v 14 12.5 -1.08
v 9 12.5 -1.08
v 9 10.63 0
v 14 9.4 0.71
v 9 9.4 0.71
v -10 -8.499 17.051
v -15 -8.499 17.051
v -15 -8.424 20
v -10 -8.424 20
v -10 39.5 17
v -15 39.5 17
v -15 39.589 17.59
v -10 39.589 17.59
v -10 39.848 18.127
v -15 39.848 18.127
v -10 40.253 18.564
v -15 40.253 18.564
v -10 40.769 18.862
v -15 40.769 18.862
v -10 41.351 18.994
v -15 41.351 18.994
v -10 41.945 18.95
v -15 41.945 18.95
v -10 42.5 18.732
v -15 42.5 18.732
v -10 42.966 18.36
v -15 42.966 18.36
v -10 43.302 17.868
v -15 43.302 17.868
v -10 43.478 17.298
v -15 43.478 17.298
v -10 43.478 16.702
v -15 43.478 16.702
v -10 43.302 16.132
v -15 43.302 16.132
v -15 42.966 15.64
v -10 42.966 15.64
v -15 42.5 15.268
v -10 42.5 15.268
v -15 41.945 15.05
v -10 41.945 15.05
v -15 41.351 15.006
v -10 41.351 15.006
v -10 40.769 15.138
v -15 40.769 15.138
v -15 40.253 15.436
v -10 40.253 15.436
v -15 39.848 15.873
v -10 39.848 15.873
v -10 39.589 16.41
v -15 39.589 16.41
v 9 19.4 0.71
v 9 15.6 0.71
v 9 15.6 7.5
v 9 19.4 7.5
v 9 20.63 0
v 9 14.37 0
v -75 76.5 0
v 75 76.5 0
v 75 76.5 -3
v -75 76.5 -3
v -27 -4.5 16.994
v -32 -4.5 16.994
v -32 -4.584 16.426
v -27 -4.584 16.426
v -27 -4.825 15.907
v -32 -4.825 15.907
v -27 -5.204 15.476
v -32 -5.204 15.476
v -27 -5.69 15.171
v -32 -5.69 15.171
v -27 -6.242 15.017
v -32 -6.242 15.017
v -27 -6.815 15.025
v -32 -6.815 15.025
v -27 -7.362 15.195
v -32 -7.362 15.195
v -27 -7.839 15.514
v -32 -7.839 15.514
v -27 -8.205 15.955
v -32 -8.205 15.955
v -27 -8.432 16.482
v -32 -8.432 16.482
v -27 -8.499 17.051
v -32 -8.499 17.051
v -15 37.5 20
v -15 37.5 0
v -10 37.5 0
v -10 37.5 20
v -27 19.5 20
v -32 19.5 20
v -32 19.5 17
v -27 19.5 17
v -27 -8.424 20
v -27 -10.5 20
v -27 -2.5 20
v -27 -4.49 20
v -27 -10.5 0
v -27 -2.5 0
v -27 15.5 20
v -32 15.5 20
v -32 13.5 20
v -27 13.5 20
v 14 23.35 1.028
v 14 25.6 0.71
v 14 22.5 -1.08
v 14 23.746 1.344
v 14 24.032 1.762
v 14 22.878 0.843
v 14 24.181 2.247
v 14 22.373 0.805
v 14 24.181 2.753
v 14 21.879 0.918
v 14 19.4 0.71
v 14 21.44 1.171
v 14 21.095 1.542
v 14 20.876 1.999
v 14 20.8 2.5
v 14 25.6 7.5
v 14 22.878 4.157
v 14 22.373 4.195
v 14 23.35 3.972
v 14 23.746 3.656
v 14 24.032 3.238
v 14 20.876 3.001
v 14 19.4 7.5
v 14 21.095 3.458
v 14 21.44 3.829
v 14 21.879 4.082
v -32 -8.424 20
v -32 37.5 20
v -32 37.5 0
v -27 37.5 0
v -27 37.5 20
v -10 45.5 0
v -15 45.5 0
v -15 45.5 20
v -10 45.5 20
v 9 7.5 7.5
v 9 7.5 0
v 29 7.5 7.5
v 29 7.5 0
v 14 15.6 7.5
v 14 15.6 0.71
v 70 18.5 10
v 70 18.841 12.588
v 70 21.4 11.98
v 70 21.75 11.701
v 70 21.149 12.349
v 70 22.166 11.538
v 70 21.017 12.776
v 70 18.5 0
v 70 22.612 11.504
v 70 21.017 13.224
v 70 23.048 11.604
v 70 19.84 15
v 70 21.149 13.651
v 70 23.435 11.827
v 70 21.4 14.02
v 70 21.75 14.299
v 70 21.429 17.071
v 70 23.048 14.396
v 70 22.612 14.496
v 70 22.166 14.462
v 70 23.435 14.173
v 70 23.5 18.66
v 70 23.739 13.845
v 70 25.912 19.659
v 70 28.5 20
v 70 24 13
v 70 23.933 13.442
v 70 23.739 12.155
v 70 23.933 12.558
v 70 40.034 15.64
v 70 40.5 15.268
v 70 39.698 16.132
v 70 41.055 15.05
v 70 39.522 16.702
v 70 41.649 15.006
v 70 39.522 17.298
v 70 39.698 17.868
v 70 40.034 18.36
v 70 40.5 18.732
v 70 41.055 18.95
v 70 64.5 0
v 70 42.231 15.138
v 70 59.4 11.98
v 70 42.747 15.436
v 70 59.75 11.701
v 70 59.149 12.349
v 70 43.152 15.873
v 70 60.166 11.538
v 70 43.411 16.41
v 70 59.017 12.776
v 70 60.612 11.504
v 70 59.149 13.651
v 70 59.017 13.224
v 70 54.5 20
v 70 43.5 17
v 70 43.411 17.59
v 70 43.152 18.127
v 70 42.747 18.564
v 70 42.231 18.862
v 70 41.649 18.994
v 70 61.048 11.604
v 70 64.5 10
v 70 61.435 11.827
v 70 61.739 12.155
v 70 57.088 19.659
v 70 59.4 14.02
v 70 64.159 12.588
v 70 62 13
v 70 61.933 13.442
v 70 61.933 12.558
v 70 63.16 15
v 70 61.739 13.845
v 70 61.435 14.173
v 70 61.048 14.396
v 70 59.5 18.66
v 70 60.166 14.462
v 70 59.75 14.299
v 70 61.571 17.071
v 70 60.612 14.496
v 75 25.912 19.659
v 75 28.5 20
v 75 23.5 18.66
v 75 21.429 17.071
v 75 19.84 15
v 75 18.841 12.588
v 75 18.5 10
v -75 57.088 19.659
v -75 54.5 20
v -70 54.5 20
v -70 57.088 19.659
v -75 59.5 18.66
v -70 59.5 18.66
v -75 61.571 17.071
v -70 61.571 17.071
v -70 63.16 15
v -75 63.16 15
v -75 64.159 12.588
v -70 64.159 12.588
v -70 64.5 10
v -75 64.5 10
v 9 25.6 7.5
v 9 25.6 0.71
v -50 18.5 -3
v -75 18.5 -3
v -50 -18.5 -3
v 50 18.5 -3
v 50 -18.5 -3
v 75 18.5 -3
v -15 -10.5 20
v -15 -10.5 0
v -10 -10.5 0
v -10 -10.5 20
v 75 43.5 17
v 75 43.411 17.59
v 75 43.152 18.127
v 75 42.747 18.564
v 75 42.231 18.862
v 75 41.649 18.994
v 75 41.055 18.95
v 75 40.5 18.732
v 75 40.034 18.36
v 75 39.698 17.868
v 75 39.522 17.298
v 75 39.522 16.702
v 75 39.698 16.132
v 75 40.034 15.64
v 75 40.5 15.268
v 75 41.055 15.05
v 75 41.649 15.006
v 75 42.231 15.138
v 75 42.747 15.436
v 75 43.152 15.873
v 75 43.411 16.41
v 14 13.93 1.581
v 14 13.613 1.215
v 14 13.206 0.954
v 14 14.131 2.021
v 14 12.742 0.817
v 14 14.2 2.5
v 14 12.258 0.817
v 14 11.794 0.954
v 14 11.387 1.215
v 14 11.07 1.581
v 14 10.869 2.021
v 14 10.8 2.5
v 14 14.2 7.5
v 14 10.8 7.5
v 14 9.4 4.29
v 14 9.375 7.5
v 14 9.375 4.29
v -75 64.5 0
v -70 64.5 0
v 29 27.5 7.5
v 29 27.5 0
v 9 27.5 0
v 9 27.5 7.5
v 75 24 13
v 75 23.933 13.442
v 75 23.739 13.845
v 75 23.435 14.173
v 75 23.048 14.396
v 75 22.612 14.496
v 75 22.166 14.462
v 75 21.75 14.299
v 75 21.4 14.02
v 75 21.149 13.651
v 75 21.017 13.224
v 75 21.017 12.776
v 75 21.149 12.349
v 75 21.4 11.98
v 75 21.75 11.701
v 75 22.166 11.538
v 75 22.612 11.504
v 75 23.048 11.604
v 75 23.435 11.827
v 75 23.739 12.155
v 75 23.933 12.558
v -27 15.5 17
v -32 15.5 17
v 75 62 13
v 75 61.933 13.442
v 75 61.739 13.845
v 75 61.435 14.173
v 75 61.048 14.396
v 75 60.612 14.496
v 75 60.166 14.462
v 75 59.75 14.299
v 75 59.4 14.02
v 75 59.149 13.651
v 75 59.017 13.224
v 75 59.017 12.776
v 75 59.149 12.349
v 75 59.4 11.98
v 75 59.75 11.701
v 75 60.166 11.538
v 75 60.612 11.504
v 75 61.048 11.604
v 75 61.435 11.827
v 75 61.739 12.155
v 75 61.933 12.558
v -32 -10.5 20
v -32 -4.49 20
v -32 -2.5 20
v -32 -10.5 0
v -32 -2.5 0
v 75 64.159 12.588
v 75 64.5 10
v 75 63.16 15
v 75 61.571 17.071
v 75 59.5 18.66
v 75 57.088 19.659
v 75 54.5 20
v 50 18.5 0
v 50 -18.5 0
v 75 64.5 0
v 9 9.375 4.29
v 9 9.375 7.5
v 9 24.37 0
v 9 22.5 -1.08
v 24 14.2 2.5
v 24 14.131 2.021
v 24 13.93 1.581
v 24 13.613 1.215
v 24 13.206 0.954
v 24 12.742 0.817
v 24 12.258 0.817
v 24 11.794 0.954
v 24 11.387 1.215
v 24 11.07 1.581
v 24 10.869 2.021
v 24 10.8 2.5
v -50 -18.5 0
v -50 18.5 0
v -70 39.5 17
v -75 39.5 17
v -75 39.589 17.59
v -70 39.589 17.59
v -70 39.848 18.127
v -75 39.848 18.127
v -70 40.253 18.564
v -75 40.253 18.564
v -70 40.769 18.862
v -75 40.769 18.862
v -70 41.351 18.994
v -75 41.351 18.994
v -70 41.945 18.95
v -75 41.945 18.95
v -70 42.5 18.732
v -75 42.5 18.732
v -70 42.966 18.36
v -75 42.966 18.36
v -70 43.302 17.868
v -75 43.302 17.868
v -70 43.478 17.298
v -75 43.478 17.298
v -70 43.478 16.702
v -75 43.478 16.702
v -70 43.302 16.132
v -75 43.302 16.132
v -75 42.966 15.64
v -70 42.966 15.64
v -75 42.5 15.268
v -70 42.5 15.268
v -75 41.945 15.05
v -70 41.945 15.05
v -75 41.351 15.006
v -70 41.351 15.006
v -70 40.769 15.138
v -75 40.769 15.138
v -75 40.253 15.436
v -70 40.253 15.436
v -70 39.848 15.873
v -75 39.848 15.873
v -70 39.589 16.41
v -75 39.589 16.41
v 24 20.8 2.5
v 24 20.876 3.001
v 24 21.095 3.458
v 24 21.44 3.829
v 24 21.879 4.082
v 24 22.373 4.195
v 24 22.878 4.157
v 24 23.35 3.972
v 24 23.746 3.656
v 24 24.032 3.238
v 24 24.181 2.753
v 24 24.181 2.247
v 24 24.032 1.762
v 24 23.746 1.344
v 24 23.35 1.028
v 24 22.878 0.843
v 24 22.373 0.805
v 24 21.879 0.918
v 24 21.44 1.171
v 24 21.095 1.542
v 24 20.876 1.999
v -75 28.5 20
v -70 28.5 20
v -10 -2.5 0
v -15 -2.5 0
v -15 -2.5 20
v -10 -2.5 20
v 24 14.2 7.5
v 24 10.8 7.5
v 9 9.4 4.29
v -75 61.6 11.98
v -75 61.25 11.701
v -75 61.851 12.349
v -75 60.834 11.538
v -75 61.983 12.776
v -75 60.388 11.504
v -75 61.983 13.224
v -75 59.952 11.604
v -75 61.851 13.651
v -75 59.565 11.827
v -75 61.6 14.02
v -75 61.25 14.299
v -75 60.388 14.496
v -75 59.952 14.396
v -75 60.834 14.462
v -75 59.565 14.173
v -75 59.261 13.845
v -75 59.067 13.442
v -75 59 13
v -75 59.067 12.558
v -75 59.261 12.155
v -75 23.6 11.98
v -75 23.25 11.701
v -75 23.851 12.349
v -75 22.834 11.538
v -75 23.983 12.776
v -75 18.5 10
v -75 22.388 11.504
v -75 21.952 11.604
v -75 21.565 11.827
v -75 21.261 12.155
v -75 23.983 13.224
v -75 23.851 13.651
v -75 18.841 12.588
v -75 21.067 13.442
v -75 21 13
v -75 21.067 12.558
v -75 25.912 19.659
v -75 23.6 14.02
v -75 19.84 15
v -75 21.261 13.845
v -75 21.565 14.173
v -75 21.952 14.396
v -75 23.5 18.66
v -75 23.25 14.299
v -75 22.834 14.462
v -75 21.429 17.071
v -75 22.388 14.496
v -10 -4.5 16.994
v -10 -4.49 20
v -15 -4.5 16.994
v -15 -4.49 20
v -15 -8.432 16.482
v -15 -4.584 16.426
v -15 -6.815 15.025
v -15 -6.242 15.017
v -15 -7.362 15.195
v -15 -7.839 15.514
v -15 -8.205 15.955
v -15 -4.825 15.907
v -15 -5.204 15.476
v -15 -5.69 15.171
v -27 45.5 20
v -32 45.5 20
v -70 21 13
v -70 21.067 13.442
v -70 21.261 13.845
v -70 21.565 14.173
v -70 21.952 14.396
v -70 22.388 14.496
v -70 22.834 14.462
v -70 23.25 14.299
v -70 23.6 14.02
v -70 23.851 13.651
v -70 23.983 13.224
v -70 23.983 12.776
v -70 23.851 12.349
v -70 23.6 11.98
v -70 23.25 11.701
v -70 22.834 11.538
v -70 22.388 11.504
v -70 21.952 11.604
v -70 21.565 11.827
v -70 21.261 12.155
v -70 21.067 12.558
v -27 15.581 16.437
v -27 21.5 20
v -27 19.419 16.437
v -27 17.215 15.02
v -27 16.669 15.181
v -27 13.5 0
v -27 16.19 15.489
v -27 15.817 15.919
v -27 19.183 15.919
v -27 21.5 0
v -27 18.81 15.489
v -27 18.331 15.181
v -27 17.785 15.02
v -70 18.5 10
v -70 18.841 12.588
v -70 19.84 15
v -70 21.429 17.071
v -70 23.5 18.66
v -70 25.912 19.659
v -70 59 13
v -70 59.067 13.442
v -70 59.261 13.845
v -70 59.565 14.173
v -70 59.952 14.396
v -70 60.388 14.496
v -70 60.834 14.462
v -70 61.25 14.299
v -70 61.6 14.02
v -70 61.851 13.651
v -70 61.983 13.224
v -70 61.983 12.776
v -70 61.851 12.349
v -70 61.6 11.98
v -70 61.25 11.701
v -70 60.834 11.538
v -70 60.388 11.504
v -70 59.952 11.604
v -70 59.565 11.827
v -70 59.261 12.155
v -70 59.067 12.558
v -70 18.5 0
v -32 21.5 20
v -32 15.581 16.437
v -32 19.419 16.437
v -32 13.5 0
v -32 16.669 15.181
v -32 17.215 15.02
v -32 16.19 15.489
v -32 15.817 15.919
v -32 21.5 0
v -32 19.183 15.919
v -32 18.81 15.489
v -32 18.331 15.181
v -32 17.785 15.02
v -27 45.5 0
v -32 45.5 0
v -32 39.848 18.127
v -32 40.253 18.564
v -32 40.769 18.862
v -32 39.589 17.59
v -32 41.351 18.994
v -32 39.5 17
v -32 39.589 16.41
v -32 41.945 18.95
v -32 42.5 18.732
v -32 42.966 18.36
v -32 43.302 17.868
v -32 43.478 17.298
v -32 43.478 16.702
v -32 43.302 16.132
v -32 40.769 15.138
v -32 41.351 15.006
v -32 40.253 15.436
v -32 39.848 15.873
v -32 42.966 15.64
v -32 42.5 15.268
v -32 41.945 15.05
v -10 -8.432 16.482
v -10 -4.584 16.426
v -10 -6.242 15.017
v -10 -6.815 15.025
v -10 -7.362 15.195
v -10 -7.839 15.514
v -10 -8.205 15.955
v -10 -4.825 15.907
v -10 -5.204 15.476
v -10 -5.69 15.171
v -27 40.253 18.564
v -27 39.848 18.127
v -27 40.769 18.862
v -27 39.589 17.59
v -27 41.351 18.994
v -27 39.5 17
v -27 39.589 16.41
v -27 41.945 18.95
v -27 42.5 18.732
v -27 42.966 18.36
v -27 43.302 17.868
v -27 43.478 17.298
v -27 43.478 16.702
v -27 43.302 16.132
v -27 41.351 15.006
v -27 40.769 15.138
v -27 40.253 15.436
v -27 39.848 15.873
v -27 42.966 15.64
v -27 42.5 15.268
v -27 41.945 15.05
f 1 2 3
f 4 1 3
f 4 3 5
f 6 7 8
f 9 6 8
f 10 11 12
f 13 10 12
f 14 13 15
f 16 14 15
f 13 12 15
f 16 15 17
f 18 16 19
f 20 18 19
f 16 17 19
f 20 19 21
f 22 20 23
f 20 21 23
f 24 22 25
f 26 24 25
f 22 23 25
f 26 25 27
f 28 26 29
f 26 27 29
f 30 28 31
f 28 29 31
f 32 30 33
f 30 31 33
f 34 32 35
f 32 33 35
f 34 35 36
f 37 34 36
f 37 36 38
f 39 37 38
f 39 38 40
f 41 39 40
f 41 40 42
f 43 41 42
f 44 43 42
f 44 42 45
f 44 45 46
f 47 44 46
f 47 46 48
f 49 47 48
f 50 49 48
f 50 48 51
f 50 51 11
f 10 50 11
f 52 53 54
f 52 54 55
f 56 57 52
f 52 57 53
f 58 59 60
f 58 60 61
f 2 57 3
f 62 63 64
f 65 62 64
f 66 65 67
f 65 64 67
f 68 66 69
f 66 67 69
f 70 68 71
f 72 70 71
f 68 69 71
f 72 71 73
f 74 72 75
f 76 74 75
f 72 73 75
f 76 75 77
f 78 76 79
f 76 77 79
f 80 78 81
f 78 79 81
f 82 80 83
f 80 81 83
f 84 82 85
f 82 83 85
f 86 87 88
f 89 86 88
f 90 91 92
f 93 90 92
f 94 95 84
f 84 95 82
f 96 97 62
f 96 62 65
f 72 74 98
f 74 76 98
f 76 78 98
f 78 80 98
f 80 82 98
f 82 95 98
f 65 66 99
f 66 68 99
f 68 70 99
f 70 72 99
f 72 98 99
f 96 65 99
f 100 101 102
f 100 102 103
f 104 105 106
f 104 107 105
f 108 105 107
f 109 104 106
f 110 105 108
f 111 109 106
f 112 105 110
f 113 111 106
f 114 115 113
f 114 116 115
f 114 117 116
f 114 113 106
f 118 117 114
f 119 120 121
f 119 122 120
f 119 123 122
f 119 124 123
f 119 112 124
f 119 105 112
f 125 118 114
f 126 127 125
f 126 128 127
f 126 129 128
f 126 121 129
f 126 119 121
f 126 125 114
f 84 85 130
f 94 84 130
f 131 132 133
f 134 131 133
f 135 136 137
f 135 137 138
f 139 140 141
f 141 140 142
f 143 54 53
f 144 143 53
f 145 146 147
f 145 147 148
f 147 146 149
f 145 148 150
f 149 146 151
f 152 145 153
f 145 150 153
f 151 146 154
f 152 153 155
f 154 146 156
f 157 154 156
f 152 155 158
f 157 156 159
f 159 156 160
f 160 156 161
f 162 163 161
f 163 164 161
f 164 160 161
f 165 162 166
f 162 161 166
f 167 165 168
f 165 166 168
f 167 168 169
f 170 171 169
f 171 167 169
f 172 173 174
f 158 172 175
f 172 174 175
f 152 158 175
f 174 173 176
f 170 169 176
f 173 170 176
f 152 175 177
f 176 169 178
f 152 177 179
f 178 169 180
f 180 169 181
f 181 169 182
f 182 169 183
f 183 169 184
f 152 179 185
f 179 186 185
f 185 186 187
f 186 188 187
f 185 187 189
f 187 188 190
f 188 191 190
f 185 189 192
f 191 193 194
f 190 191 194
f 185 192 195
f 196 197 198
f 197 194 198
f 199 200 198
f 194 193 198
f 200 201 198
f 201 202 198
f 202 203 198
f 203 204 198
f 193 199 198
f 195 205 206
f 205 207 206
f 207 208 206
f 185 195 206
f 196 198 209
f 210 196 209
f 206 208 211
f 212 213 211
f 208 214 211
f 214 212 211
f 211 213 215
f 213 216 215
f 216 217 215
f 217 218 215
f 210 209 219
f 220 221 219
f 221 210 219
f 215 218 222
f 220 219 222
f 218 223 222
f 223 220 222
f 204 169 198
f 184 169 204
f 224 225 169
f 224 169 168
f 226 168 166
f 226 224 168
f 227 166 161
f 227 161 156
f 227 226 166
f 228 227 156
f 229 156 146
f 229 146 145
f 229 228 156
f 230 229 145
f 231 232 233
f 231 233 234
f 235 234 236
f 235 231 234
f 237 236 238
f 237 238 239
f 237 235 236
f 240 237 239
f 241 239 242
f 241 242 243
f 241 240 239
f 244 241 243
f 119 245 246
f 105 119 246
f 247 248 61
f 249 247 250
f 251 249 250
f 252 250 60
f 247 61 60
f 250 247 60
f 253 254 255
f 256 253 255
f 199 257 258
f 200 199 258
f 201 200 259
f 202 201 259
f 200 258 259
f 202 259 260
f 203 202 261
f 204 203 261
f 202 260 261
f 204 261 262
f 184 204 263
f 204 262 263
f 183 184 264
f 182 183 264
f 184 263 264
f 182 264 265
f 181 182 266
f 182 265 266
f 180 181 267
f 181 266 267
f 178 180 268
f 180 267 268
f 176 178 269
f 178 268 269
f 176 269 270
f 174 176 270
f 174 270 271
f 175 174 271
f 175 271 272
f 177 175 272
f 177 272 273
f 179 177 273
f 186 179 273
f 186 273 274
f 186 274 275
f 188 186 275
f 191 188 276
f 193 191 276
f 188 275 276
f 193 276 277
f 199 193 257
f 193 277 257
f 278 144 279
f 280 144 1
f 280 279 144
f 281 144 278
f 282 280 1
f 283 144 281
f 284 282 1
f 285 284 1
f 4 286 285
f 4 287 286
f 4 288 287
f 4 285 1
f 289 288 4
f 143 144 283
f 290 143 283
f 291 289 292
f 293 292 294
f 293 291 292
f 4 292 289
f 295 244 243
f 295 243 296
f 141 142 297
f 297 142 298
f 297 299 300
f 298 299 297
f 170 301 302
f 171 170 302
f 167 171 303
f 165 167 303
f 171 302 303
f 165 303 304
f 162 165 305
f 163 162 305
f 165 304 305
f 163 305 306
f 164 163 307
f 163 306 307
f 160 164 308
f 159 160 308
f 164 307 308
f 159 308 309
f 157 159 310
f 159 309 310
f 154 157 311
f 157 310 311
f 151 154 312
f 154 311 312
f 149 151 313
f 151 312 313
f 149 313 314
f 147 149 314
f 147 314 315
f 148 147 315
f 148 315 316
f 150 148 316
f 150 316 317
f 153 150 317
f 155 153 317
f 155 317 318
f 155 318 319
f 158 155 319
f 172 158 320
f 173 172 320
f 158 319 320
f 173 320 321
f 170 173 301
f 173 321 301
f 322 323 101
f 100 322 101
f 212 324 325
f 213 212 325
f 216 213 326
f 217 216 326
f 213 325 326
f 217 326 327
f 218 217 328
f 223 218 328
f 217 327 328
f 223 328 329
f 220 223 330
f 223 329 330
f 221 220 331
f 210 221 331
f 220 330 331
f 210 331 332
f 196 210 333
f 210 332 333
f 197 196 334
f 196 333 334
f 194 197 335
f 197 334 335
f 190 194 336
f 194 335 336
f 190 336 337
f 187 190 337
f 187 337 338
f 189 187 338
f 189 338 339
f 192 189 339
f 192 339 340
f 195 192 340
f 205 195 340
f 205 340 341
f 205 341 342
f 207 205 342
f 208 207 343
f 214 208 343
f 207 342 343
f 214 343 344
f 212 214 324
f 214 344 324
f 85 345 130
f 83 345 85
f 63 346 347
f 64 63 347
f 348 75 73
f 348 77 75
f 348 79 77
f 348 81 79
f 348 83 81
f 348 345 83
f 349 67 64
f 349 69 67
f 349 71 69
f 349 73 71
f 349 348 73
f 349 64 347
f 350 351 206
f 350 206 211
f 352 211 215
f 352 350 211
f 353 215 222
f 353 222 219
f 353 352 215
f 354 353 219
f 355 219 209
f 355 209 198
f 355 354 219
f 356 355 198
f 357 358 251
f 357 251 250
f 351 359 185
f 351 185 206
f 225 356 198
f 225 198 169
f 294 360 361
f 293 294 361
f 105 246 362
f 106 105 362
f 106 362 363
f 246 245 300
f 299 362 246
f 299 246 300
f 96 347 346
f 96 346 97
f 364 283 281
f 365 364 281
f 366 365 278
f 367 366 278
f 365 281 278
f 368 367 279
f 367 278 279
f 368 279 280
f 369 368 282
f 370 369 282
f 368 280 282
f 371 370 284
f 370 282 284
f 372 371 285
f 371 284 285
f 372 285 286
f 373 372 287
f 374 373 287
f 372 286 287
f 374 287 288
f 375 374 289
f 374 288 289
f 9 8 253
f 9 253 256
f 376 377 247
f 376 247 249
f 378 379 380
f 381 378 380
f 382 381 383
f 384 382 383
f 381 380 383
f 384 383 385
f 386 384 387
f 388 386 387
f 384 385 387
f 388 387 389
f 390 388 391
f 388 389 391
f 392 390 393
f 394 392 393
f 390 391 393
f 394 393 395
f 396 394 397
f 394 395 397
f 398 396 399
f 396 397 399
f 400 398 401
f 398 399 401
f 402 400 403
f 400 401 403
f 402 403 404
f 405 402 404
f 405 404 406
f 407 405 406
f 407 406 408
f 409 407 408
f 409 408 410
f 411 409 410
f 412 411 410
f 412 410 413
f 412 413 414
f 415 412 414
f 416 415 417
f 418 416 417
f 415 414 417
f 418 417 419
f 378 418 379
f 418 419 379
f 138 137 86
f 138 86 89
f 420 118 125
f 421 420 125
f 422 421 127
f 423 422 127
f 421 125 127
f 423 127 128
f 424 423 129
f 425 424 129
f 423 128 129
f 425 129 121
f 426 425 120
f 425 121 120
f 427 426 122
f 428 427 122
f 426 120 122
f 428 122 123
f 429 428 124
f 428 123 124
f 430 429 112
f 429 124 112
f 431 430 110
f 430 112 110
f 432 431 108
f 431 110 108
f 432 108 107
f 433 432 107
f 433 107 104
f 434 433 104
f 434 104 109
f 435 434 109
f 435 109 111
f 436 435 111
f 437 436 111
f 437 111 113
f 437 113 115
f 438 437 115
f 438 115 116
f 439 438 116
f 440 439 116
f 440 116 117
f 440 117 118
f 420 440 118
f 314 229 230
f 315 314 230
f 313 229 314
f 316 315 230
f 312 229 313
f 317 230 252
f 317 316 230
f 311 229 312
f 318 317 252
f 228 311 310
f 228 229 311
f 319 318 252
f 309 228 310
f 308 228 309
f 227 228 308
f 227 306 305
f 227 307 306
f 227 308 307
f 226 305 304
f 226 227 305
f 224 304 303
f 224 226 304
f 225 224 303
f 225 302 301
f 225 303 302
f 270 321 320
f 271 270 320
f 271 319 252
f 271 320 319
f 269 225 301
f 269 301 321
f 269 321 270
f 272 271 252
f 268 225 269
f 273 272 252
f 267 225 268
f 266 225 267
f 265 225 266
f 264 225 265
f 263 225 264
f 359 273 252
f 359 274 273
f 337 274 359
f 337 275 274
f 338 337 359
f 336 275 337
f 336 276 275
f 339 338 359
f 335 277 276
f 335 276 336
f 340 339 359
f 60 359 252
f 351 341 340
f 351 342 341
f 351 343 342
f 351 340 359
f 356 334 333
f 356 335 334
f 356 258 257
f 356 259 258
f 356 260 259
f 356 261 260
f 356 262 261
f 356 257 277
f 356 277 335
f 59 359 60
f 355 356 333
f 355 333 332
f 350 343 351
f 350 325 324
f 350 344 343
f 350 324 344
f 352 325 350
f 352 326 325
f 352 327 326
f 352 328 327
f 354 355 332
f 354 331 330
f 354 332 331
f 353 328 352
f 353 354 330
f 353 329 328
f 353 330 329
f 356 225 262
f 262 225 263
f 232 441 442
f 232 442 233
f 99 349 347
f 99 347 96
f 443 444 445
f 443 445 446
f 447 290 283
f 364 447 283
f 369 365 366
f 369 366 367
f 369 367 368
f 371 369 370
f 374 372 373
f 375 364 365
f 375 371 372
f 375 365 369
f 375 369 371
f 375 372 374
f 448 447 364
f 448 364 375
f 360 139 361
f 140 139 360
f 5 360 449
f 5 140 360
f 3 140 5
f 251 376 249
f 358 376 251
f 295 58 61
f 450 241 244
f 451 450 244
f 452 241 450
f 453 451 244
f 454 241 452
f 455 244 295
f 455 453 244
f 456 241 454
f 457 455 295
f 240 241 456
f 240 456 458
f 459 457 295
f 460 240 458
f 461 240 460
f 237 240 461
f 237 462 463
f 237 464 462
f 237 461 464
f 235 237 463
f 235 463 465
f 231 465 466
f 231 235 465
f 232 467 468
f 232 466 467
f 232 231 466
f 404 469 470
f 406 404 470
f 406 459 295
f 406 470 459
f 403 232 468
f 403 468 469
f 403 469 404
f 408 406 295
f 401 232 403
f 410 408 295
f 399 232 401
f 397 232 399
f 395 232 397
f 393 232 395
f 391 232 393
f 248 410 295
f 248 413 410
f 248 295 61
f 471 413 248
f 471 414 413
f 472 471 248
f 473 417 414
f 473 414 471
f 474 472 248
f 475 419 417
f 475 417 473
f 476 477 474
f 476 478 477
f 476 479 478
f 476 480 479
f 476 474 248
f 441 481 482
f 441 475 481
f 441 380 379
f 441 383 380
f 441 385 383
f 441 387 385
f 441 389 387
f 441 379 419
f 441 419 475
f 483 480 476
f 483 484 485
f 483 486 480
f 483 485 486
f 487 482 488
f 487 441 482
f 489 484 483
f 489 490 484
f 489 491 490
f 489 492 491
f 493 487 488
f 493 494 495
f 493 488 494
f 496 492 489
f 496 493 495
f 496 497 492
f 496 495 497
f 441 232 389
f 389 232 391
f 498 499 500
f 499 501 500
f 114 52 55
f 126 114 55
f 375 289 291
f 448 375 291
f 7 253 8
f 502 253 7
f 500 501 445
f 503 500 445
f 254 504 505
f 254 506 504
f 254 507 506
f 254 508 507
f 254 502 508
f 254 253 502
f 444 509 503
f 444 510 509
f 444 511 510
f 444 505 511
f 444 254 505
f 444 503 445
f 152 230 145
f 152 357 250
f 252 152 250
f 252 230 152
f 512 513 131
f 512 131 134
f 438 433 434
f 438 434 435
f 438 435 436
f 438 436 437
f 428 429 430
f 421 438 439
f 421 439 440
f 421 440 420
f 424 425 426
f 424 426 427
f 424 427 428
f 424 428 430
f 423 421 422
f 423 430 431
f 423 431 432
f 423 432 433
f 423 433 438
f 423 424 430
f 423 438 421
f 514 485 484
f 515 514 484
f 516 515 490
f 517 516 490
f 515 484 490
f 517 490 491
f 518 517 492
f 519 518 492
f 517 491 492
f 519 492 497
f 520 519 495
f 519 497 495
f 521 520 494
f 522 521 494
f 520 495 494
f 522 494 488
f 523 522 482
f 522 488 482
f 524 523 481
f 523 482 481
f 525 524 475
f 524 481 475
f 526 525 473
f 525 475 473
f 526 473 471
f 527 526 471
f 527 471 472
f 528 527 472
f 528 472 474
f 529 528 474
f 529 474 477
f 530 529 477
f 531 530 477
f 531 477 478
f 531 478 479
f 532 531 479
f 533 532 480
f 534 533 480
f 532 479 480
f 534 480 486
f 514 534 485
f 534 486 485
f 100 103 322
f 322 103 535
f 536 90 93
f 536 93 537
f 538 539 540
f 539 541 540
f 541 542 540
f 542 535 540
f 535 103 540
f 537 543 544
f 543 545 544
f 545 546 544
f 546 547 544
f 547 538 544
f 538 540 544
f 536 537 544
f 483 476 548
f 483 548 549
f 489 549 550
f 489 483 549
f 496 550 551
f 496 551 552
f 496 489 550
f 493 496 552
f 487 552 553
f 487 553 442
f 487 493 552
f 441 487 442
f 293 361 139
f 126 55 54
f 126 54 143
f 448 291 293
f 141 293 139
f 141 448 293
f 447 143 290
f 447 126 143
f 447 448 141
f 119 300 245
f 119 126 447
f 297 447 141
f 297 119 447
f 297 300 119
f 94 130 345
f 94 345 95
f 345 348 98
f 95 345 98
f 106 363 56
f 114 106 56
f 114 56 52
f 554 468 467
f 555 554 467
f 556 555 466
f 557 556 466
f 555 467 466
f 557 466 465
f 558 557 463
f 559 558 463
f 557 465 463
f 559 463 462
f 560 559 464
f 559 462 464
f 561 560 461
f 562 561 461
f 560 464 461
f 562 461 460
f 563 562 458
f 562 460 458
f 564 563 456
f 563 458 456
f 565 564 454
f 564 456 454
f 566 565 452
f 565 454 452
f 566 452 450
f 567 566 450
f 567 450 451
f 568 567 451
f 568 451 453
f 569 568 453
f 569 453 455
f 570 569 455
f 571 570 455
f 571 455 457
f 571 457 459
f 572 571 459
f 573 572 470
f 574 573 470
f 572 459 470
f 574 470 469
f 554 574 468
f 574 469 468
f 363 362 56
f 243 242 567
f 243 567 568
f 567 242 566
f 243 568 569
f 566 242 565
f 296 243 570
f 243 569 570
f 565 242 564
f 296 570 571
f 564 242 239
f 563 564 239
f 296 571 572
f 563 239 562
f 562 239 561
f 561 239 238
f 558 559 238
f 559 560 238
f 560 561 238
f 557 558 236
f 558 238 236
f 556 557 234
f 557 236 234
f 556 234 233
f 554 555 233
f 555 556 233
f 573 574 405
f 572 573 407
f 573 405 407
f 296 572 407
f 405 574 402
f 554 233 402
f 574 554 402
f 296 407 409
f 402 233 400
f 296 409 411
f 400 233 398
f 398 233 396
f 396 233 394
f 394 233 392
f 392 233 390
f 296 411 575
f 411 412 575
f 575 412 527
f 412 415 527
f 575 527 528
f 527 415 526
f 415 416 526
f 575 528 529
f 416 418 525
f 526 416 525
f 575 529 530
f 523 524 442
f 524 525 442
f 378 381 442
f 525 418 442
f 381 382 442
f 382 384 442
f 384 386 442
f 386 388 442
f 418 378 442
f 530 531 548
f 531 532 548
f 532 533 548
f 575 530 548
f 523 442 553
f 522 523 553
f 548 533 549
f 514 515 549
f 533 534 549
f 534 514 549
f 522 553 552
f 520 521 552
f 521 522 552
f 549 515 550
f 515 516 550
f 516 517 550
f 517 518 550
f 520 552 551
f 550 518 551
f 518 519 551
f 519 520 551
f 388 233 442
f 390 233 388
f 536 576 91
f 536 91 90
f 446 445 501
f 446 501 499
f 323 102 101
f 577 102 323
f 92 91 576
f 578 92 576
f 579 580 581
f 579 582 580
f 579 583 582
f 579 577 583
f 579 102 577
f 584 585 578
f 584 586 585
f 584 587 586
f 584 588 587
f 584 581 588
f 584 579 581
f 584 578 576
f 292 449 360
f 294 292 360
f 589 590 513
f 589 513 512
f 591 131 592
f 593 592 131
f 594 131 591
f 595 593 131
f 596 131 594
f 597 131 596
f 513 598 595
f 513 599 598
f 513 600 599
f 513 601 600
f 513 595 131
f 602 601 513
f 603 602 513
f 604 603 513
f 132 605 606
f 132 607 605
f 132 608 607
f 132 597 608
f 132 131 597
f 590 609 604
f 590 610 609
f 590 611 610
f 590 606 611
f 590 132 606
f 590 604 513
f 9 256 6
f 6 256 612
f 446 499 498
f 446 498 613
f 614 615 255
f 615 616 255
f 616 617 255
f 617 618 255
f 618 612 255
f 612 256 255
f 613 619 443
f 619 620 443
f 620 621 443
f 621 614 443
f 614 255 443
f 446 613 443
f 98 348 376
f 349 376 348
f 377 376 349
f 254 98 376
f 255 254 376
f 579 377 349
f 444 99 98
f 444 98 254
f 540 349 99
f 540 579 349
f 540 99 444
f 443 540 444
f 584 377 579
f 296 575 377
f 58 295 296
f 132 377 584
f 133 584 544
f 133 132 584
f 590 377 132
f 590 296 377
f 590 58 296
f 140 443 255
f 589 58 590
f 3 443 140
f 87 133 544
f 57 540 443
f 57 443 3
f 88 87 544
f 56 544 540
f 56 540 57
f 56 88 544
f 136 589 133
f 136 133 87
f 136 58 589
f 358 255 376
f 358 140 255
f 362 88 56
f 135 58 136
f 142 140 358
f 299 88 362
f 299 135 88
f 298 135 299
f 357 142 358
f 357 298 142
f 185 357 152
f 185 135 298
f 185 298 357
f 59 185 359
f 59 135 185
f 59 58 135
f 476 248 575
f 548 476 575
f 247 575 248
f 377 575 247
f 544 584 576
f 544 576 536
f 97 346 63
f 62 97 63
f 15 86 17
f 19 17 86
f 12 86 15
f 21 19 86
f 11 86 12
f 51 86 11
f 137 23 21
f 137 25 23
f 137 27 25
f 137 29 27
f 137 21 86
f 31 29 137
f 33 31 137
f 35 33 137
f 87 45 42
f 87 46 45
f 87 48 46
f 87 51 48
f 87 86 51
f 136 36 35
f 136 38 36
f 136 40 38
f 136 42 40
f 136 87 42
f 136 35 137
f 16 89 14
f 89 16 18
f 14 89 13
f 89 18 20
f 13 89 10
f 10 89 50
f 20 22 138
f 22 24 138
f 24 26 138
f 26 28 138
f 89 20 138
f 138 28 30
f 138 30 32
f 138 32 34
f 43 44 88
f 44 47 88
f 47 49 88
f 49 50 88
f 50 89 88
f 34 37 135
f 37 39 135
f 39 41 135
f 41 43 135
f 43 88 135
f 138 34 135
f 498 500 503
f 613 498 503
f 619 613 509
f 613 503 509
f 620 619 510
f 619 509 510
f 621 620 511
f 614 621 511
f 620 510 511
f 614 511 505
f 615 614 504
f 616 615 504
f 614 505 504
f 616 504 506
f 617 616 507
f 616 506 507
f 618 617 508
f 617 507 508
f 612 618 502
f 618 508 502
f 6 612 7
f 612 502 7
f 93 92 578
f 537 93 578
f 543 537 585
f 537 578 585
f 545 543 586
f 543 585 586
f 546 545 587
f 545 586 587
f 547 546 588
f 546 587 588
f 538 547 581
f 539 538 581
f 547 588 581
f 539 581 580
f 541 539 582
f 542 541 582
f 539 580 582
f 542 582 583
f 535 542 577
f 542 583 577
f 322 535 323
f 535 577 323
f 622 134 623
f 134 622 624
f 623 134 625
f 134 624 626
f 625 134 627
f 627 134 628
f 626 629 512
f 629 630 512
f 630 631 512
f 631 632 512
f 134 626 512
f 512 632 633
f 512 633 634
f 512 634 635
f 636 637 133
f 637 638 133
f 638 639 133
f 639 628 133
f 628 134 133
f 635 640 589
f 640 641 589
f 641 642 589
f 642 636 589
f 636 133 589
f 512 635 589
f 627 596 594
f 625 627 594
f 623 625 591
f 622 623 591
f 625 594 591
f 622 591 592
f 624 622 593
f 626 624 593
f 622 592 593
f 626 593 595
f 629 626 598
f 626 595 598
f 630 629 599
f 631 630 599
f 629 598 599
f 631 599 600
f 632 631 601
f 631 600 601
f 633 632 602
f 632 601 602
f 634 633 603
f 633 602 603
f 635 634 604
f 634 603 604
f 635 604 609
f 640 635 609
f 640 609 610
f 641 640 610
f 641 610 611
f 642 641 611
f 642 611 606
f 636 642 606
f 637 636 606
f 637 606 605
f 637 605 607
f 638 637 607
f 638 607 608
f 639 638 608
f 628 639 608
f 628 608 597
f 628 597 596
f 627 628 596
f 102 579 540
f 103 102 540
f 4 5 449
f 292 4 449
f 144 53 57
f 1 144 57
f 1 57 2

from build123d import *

# Parameters (mm, degrees)
F1_DEPTH  = 3
F2_R      = 1.5
F2_R_2    = 2
F3_DEPTH  = 5
F4_R      = 1.5
F4_R_2    = 2
F5_DEPTH  = 5
F6_W      = 5
F6_H      = 8
F7_DEPTH  = 20
F9_DEPTH  = 25.4
F10_R     = 2
F11_DEPTH = 25.4
F12_W     = 20
F12_H     = 20
F13_DEPTH = 7.5
F14_R     = 1.7
F15_DEPTH = 5
F16_DEPTH = 15
F18_DEPTH = 10


with BuildPart() as f1:
    # F0 (on Top) → F1 (new body)
    with BuildSketch(Plane.XY):
        Polygon((-50, -18.5), (50, -18.5), (50, 18.5), (75, 18.5), (75, 76.5), (-75, 76.5), (-75, 18.5), (-50, 18.5), align=None)
    extrude(amount=-F1_DEPTH)

    # F2 (on face) → F3 (join)
    with BuildSketch(Plane.YZ.offset(75)):
        with BuildLine():
            Line((18.5, 10), (18.5, -3))
            Line((18.5, -3), (64.5, -3))
            Line((64.5, -3), (64.5, 10))
            ThreePointArc((64.5, 10), (61.5710678119, 17.0710678119), (54.5, 20))
            Line((54.5, 20), (28.5, 20))
            ThreePointArc((28.5, 20), (21.4289321881, 17.0710678119), (18.5, 10))
        make_face()
        with Locations((22.5, 13)):
            Circle(F2_R, mode=Mode.SUBTRACT)
        with Locations((60.5, 13)):
            Circle(F2_R, mode=Mode.SUBTRACT)
        with Locations((41.5, 17)):
            Circle(F2_R_2, mode=Mode.SUBTRACT)
    extrude(amount=-F3_DEPTH)

    # F4 (on face) → F5 (join)
    with BuildSketch(Plane(origin=(-75, 0, 0), x_dir=(0, -1, 0), z_dir=(-1, 0, 0))):
        with BuildLine():
            Line((-64.5, 10), (-64.5, 0))
            Line((-64.5, 0), (-18.5, 0))
            Line((-18.5, 0), (-18.5, 10))
            ThreePointArc((-18.5, 10), (-21.4289321881, 17.0710678119), (-28.5, 20))
            Line((-28.5, 20), (-54.5, 20))
            ThreePointArc((-54.5, 20), (-61.5710678119, 17.0710678119), (-64.5, 10))
        make_face()
        with Locations((-60.5, 13)):
            Circle(F4_R, mode=Mode.SUBTRACT)
        with Locations((-22.5, 13)):
            Circle(F4_R, mode=Mode.SUBTRACT)
        with Locations((-41.5, 17)):
            Circle(F4_R_2, mode=Mode.SUBTRACT)
    extrude(amount=-F5_DEPTH)

    # F6 (on face) → F7 (join)
    with BuildSketch(Plane.XY):
        with Locations((-29.5, 41.5)):
            Rectangle(F6_W, F6_H)
        with Locations((-29.5, 17.5)):
            Rectangle(F6_W, F6_H)
        with Locations((-29.5, -6.5)):
            Rectangle(F6_W, F6_H)
        with Locations((-12.5, 41.5)):
            Rectangle(F6_W, F6_H)
        with Locations((-12.5, -6.5)):
            Rectangle(F6_W, F6_H)
    extrude(amount=F7_DEPTH)

    # F8 (on face) → F9 (cut)
    with BuildSketch(Plane(origin=(-32, 0, 0), x_dir=(0, -1, 0), z_dir=(-1, 0, 0))):
        with BuildLine():
            Line((4.48324112, 22.2221616161), (4.5000102861, 16.9935856035))
            ThreePointArc((4.5000102861, 16.9935856035), (6.5287446527, 15.0002065744), (8.4993478236, 17.0510713252))
            Line((8.4993478236, 17.0510713252), (8.3693183096, 22.1414860464))
            Line((8.3693183096, 22.1414860464), (4.48324112, 22.2221616161))
        make_face()
        with BuildLine():
            Line((-19.5, 20.0955439359), (-19.5, 17))
            ThreePointArc((-19.5, 17), (-17.5, 15), (-15.5, 17))
            Line((-15.5, 17), (-15.5, 20.6426493824))
            Line((-15.5, 20.6426493824), (-19.5, 20.0955439359))
        make_face()
    extrude(amount=-F9_DEPTH, mode=Mode.SUBTRACT)

    # F10 (on face) → F11 (cut)
    with BuildSketch(Plane(origin=(-32, 0, 0), x_dir=(0, -1, 0), z_dir=(-1, 0, 0))):
        with Locations((-41.5, 17)):
            Circle(F10_R)
    extrude(amount=-F11_DEPTH, mode=Mode.SUBTRACT)

    # F12 (on face) → F13 (join)
    with BuildSketch(Plane.XY):
        with Locations((19, 17.5)):
            Rectangle(F12_W, F12_H)
    extrude(amount=F13_DEPTH)

    # F14 (on face) → F15 (cut)
    with BuildSketch(Plane(origin=(9, 0, 0), x_dir=(0, -1, 0), z_dir=(-1, 0, 0))):
        Polygon((-22.5, -1.079571669), (-19.4, 0.7102141655), (-19.4, 4.2897858345), (-25.6, 4.2897858345), (-25.6, 0.7102141655), align=None)
        with Locations((-22.5, 2.5)):
            Circle(F14_R, mode=Mode.SUBTRACT)
        Polygon((-25.6, 4.2897858345), (-19.4, 4.2897858345), (-22.5, 6.079571669), align=None)
        Polygon((-22.5, 6.079571669), (-19.4, 4.2897858345), (-19.4, 10.6374248862), (-25.6, 10.6374248862), (-25.6, 4.2897858345), align=None)
        Polygon((-12.5, -1.079571669), (-9.4, 0.7102141655), (-9.4, 4.2897858345), (-15.6, 4.2897858345), (-15.6, 0.7102141655), align=None)
        with Locations((-12.5, 2.5)):
            Circle(F14_R, mode=Mode.SUBTRACT)
        Polygon((-15.6, 4.2897858345), (-9.4, 4.2897858345), (-12.5, 6.079571669), align=None)
        Polygon((-12.5, 6.079571669), (-9.4, 4.2897858345), (-9.3752695248, 4.2897858345), (-9.3752695248, 11.5191247314), (-15.6, 11.5191247314), (-15.6, 4.2897858345), align=None)
        with Locations((-22.5, 2.5)):
            Circle(F14_R)
        with Locations((-12.5, 2.5)):
            Circle(F14_R)
    extrude(amount=-F15_DEPTH, mode=Mode.SUBTRACT)

    # F14 (on face) → F16 (cut)
    with BuildSketch(Plane(origin=(9, 0, 0), x_dir=(0, -1, 0), z_dir=(-1, 0, 0))):
        with Locations((-22.5, 2.5)):
            Circle(F14_R)
        with Locations((-12.5, 2.5)):
            Circle(F14_R)
    extrude(amount=-F16_DEPTH, mode=Mode.SUBTRACT)

    # F17 (on face) → F18 (cut)
    with BuildSketch(Plane(origin=(14, 0, 0), x_dir=(0, -1, 0), z_dir=(-1, 0, 0))):
        with BuildLine():
            Line((-14.2, 7.5), (-14.2, 2.5))
            ThreePointArc((-14.2, 2.5), (-12.5, 4.2), (-10.8, 2.5))
            Line((-10.8, 2.5), (-10.8, 7.5))
            Line((-10.8, 7.5), (-14.2, 7.5))
        make_face()
    extrude(amount=-F18_DEPTH, mode=Mode.SUBTRACT)


solid = f1.part
